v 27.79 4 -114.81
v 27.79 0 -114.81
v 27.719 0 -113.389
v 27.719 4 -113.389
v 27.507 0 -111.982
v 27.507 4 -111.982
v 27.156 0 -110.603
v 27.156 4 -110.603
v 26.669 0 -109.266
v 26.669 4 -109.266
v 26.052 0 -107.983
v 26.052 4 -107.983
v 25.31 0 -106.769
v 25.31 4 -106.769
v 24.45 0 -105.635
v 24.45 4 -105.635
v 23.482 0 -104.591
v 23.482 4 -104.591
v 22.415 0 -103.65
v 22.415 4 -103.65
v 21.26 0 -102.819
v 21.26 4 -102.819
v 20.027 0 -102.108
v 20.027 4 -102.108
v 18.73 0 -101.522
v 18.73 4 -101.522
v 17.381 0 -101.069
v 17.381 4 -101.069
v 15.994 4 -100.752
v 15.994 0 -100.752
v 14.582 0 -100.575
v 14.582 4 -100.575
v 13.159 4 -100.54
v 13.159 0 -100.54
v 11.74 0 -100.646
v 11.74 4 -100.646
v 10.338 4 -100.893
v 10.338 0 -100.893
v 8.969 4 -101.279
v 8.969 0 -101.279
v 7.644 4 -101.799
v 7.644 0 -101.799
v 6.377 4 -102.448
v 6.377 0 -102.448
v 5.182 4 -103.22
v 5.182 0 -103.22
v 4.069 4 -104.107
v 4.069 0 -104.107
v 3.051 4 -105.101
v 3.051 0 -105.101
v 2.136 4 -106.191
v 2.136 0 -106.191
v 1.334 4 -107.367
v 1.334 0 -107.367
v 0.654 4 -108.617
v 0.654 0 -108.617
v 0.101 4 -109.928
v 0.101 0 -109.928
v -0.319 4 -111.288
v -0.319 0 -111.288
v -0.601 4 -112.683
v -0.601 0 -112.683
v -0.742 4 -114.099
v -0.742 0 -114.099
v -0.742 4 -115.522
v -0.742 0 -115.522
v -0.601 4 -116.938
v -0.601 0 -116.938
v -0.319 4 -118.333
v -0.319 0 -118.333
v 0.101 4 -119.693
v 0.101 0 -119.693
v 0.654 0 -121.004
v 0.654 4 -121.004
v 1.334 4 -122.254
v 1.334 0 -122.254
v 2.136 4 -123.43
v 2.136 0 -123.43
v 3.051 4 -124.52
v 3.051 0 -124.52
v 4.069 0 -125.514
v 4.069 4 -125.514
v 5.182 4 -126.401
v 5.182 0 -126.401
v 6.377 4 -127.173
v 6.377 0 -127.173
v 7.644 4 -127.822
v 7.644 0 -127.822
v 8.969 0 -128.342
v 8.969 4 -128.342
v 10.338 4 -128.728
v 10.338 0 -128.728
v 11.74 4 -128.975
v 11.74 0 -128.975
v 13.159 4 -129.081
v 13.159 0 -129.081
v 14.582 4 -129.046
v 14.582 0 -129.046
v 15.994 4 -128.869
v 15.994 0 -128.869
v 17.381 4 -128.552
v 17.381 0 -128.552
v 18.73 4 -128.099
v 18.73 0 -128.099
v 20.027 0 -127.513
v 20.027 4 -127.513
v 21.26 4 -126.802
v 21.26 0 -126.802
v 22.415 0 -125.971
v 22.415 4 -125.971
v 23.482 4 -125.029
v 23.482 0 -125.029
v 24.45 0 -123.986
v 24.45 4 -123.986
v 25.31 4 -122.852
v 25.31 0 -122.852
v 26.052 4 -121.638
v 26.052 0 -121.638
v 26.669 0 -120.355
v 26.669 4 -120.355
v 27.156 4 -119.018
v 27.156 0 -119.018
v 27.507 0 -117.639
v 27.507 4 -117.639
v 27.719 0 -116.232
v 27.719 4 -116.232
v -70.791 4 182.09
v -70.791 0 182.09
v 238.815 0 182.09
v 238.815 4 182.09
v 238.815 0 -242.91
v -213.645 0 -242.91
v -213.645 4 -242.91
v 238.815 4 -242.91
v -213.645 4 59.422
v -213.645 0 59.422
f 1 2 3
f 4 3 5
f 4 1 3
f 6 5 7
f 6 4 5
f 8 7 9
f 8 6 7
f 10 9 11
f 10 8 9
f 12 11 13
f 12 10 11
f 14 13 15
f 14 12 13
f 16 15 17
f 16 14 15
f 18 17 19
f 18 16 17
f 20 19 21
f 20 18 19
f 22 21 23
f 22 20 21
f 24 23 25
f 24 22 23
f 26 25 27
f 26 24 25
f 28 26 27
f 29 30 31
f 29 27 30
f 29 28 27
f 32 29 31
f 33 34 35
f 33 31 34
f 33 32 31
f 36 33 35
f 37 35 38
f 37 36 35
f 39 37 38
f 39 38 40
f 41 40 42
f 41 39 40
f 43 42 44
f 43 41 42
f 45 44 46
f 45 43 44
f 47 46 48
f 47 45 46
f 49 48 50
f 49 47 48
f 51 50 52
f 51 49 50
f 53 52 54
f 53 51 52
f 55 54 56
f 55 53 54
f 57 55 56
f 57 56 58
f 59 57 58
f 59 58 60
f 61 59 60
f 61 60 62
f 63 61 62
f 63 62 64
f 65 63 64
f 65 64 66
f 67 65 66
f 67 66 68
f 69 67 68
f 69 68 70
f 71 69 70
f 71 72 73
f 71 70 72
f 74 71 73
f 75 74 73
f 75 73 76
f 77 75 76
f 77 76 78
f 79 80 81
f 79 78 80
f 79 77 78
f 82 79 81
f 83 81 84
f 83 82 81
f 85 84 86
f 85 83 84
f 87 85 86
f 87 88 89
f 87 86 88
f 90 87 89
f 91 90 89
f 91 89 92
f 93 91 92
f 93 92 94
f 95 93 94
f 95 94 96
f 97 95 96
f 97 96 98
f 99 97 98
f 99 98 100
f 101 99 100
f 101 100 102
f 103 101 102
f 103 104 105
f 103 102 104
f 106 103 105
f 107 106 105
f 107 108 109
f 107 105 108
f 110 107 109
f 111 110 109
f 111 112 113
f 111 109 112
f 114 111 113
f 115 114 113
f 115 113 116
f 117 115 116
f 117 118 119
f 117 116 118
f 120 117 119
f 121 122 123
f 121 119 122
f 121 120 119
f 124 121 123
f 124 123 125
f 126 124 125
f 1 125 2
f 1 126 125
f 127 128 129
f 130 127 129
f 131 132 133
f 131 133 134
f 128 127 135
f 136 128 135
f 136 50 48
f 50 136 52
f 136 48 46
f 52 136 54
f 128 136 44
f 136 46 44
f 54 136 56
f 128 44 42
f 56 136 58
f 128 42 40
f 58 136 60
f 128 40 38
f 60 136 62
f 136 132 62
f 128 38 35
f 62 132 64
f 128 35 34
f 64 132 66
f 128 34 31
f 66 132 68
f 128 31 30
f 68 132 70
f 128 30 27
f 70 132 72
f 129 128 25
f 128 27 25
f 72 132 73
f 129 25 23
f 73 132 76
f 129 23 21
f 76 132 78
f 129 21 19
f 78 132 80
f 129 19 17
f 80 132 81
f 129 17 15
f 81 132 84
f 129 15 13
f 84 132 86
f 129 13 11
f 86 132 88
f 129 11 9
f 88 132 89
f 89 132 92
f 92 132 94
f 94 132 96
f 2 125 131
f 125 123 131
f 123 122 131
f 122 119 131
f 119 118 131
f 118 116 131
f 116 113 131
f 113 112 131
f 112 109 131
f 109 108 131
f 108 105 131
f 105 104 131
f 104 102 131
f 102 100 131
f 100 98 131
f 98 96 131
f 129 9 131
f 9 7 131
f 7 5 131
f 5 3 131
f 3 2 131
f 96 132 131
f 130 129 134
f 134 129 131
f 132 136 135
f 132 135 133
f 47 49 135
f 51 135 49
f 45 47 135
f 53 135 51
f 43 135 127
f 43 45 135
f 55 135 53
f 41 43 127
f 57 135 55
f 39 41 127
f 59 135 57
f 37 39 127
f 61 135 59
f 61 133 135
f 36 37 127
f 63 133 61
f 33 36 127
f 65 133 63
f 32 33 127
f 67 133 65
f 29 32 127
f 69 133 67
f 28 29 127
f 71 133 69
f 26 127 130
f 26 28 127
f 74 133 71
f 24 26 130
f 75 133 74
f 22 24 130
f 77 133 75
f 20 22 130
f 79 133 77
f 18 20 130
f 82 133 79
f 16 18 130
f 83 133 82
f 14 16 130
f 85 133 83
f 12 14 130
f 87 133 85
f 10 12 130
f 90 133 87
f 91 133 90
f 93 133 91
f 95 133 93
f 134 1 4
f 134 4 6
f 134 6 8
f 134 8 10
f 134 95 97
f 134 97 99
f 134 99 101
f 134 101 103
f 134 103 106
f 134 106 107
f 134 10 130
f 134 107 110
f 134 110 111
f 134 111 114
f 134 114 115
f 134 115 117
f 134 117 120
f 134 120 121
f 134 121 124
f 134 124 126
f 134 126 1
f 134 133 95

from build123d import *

# Parameters (mm, degrees)
SKETCH1_W           = 452.46
SKETCH1_H           = 425
BOSS_EXTRUDE1_DEPTH = 4
SKETCH2_R           = 14.275
CUT_EXTRUDE1_DEPTH  = 5
CUT_EXTRUDE2_DEPTH  = 5


with BuildPart() as part:
    # Sketch1 → Boss-Extrude1 (new body)
    with BuildSketch(Plane(origin=(0, 0, 0), x_dir=(1, 0, 0), z_dir=(0, 1, 0))):
        with Locations((12.58495796, 30.41049436)):
            Rectangle(SKETCH1_W, SKETCH1_H)
    extrude(amount=BOSS_EXTRUDE1_DEPTH)

    # Sketch2 → Cut-Extrude1 (cut, through all)
    with BuildSketch(Plane.XZ.offset(-4)):
        with Locations((13.51495796, -114.81049436)):
            Circle(SKETCH2_R)
    extrude(amount=CUT_EXTRUDE1_DEPTH, mode=Mode.SUBTRACT)

    # Sketch3 → Cut-Extrude2 (cut, through all)
    with BuildSketch(Plane(origin=(0, 4, 0), x_dir=(1, 0, 0), z_dir=(0, 1, 0))):
        Polygon((-70.791344552, -182.08950564), (-213.64504204, -59.421992734), (-317.358115476, -168.108607174), (-142.218193296, -320.092437945), align=None)
    extrude(amount=-CUT_EXTRUDE2_DEPTH, mode=Mode.SUBTRACT)


solid = part.part
